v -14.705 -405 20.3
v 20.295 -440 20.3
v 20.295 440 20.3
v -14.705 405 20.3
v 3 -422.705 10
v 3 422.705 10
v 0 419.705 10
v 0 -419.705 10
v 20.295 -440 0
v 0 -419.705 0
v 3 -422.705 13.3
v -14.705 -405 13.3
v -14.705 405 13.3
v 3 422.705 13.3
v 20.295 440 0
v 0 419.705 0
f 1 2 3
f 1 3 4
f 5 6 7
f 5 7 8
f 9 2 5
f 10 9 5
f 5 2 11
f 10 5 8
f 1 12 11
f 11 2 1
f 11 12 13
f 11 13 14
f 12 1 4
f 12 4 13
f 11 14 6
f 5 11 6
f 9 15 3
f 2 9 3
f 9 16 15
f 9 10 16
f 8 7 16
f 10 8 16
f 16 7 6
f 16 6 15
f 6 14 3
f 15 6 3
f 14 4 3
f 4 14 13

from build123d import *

# Parameters (mm, degrees)
F1_DEPTH = 440
F3_DEPTH = 25.4


with BuildPart() as f1:
    # F0 (on Front) → F1 (new body, symmetric)
    with BuildSketch(Plane.XZ):
        Polygon((20.2946, 0), (20.2946, 20.3), (-14.7054, 20.3), (-14.7054, 13.3), (3, 13.3), (3, 10), (0, 10), (0, 0), align=None)
    extrude(amount=F1_DEPTH, both=True)

    # F2 (on face) → F3 (cut)
    with BuildSketch(Plane.XY.offset(20.3)):
        Polygon((-14.7054, 405), (20.2946, 440), (-14.7054, 440), align=None)
        Polygon((-14.7054, -440), (20.2946, -440), (-14.7054, -405), align=None)
    extrude(amount=-F3_DEPTH, mode=Mode.SUBTRACT)


solid = f1.part
